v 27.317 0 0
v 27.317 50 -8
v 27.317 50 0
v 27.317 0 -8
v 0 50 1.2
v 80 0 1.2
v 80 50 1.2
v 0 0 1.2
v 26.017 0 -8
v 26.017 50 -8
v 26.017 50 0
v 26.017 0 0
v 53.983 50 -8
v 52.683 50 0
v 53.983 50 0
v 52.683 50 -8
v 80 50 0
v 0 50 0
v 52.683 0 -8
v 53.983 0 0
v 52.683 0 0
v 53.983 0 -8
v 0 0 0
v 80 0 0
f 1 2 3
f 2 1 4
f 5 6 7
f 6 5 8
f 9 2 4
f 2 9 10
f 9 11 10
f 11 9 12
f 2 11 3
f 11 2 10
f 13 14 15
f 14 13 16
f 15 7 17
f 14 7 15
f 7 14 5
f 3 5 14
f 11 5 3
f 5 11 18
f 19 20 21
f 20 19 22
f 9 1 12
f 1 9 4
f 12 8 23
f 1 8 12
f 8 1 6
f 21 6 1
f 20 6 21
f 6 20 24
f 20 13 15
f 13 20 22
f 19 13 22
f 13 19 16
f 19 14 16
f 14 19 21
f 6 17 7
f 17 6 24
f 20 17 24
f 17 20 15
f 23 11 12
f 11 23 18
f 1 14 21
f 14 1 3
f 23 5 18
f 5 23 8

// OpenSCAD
$fn = 32;

// ----------------------------------------------------------------------
// Ribbed panel: 1.2 mm panel
// ----------------------------------------------------------------------

// --- parameters (mm) ---
panel_l = 80;             // panel length, X
panel_w = 50;             // panel width, Y
panel_t = 1.2;            // panel thickness, Z
rib_t = 1.3;              // rib thickness
rib_h = 8;                // rib height below the panel
ribs = 2;                 // number of ribs
fit_tol = 0.1;            // tolerance for press fits, mm
free_tol = 0.5;           // tolerance for clearance fits, mm

total_h = panel_t + rib_h;  // overall height

union() {
  cube([panel_l, panel_w, panel_t]);
  for (i = [1 : ribs])
    translate([i * panel_l / (ribs + 1) - rib_t / 2, 0, -rib_h])
      cube([rib_t, panel_w, rib_h + panel_t]);
}
